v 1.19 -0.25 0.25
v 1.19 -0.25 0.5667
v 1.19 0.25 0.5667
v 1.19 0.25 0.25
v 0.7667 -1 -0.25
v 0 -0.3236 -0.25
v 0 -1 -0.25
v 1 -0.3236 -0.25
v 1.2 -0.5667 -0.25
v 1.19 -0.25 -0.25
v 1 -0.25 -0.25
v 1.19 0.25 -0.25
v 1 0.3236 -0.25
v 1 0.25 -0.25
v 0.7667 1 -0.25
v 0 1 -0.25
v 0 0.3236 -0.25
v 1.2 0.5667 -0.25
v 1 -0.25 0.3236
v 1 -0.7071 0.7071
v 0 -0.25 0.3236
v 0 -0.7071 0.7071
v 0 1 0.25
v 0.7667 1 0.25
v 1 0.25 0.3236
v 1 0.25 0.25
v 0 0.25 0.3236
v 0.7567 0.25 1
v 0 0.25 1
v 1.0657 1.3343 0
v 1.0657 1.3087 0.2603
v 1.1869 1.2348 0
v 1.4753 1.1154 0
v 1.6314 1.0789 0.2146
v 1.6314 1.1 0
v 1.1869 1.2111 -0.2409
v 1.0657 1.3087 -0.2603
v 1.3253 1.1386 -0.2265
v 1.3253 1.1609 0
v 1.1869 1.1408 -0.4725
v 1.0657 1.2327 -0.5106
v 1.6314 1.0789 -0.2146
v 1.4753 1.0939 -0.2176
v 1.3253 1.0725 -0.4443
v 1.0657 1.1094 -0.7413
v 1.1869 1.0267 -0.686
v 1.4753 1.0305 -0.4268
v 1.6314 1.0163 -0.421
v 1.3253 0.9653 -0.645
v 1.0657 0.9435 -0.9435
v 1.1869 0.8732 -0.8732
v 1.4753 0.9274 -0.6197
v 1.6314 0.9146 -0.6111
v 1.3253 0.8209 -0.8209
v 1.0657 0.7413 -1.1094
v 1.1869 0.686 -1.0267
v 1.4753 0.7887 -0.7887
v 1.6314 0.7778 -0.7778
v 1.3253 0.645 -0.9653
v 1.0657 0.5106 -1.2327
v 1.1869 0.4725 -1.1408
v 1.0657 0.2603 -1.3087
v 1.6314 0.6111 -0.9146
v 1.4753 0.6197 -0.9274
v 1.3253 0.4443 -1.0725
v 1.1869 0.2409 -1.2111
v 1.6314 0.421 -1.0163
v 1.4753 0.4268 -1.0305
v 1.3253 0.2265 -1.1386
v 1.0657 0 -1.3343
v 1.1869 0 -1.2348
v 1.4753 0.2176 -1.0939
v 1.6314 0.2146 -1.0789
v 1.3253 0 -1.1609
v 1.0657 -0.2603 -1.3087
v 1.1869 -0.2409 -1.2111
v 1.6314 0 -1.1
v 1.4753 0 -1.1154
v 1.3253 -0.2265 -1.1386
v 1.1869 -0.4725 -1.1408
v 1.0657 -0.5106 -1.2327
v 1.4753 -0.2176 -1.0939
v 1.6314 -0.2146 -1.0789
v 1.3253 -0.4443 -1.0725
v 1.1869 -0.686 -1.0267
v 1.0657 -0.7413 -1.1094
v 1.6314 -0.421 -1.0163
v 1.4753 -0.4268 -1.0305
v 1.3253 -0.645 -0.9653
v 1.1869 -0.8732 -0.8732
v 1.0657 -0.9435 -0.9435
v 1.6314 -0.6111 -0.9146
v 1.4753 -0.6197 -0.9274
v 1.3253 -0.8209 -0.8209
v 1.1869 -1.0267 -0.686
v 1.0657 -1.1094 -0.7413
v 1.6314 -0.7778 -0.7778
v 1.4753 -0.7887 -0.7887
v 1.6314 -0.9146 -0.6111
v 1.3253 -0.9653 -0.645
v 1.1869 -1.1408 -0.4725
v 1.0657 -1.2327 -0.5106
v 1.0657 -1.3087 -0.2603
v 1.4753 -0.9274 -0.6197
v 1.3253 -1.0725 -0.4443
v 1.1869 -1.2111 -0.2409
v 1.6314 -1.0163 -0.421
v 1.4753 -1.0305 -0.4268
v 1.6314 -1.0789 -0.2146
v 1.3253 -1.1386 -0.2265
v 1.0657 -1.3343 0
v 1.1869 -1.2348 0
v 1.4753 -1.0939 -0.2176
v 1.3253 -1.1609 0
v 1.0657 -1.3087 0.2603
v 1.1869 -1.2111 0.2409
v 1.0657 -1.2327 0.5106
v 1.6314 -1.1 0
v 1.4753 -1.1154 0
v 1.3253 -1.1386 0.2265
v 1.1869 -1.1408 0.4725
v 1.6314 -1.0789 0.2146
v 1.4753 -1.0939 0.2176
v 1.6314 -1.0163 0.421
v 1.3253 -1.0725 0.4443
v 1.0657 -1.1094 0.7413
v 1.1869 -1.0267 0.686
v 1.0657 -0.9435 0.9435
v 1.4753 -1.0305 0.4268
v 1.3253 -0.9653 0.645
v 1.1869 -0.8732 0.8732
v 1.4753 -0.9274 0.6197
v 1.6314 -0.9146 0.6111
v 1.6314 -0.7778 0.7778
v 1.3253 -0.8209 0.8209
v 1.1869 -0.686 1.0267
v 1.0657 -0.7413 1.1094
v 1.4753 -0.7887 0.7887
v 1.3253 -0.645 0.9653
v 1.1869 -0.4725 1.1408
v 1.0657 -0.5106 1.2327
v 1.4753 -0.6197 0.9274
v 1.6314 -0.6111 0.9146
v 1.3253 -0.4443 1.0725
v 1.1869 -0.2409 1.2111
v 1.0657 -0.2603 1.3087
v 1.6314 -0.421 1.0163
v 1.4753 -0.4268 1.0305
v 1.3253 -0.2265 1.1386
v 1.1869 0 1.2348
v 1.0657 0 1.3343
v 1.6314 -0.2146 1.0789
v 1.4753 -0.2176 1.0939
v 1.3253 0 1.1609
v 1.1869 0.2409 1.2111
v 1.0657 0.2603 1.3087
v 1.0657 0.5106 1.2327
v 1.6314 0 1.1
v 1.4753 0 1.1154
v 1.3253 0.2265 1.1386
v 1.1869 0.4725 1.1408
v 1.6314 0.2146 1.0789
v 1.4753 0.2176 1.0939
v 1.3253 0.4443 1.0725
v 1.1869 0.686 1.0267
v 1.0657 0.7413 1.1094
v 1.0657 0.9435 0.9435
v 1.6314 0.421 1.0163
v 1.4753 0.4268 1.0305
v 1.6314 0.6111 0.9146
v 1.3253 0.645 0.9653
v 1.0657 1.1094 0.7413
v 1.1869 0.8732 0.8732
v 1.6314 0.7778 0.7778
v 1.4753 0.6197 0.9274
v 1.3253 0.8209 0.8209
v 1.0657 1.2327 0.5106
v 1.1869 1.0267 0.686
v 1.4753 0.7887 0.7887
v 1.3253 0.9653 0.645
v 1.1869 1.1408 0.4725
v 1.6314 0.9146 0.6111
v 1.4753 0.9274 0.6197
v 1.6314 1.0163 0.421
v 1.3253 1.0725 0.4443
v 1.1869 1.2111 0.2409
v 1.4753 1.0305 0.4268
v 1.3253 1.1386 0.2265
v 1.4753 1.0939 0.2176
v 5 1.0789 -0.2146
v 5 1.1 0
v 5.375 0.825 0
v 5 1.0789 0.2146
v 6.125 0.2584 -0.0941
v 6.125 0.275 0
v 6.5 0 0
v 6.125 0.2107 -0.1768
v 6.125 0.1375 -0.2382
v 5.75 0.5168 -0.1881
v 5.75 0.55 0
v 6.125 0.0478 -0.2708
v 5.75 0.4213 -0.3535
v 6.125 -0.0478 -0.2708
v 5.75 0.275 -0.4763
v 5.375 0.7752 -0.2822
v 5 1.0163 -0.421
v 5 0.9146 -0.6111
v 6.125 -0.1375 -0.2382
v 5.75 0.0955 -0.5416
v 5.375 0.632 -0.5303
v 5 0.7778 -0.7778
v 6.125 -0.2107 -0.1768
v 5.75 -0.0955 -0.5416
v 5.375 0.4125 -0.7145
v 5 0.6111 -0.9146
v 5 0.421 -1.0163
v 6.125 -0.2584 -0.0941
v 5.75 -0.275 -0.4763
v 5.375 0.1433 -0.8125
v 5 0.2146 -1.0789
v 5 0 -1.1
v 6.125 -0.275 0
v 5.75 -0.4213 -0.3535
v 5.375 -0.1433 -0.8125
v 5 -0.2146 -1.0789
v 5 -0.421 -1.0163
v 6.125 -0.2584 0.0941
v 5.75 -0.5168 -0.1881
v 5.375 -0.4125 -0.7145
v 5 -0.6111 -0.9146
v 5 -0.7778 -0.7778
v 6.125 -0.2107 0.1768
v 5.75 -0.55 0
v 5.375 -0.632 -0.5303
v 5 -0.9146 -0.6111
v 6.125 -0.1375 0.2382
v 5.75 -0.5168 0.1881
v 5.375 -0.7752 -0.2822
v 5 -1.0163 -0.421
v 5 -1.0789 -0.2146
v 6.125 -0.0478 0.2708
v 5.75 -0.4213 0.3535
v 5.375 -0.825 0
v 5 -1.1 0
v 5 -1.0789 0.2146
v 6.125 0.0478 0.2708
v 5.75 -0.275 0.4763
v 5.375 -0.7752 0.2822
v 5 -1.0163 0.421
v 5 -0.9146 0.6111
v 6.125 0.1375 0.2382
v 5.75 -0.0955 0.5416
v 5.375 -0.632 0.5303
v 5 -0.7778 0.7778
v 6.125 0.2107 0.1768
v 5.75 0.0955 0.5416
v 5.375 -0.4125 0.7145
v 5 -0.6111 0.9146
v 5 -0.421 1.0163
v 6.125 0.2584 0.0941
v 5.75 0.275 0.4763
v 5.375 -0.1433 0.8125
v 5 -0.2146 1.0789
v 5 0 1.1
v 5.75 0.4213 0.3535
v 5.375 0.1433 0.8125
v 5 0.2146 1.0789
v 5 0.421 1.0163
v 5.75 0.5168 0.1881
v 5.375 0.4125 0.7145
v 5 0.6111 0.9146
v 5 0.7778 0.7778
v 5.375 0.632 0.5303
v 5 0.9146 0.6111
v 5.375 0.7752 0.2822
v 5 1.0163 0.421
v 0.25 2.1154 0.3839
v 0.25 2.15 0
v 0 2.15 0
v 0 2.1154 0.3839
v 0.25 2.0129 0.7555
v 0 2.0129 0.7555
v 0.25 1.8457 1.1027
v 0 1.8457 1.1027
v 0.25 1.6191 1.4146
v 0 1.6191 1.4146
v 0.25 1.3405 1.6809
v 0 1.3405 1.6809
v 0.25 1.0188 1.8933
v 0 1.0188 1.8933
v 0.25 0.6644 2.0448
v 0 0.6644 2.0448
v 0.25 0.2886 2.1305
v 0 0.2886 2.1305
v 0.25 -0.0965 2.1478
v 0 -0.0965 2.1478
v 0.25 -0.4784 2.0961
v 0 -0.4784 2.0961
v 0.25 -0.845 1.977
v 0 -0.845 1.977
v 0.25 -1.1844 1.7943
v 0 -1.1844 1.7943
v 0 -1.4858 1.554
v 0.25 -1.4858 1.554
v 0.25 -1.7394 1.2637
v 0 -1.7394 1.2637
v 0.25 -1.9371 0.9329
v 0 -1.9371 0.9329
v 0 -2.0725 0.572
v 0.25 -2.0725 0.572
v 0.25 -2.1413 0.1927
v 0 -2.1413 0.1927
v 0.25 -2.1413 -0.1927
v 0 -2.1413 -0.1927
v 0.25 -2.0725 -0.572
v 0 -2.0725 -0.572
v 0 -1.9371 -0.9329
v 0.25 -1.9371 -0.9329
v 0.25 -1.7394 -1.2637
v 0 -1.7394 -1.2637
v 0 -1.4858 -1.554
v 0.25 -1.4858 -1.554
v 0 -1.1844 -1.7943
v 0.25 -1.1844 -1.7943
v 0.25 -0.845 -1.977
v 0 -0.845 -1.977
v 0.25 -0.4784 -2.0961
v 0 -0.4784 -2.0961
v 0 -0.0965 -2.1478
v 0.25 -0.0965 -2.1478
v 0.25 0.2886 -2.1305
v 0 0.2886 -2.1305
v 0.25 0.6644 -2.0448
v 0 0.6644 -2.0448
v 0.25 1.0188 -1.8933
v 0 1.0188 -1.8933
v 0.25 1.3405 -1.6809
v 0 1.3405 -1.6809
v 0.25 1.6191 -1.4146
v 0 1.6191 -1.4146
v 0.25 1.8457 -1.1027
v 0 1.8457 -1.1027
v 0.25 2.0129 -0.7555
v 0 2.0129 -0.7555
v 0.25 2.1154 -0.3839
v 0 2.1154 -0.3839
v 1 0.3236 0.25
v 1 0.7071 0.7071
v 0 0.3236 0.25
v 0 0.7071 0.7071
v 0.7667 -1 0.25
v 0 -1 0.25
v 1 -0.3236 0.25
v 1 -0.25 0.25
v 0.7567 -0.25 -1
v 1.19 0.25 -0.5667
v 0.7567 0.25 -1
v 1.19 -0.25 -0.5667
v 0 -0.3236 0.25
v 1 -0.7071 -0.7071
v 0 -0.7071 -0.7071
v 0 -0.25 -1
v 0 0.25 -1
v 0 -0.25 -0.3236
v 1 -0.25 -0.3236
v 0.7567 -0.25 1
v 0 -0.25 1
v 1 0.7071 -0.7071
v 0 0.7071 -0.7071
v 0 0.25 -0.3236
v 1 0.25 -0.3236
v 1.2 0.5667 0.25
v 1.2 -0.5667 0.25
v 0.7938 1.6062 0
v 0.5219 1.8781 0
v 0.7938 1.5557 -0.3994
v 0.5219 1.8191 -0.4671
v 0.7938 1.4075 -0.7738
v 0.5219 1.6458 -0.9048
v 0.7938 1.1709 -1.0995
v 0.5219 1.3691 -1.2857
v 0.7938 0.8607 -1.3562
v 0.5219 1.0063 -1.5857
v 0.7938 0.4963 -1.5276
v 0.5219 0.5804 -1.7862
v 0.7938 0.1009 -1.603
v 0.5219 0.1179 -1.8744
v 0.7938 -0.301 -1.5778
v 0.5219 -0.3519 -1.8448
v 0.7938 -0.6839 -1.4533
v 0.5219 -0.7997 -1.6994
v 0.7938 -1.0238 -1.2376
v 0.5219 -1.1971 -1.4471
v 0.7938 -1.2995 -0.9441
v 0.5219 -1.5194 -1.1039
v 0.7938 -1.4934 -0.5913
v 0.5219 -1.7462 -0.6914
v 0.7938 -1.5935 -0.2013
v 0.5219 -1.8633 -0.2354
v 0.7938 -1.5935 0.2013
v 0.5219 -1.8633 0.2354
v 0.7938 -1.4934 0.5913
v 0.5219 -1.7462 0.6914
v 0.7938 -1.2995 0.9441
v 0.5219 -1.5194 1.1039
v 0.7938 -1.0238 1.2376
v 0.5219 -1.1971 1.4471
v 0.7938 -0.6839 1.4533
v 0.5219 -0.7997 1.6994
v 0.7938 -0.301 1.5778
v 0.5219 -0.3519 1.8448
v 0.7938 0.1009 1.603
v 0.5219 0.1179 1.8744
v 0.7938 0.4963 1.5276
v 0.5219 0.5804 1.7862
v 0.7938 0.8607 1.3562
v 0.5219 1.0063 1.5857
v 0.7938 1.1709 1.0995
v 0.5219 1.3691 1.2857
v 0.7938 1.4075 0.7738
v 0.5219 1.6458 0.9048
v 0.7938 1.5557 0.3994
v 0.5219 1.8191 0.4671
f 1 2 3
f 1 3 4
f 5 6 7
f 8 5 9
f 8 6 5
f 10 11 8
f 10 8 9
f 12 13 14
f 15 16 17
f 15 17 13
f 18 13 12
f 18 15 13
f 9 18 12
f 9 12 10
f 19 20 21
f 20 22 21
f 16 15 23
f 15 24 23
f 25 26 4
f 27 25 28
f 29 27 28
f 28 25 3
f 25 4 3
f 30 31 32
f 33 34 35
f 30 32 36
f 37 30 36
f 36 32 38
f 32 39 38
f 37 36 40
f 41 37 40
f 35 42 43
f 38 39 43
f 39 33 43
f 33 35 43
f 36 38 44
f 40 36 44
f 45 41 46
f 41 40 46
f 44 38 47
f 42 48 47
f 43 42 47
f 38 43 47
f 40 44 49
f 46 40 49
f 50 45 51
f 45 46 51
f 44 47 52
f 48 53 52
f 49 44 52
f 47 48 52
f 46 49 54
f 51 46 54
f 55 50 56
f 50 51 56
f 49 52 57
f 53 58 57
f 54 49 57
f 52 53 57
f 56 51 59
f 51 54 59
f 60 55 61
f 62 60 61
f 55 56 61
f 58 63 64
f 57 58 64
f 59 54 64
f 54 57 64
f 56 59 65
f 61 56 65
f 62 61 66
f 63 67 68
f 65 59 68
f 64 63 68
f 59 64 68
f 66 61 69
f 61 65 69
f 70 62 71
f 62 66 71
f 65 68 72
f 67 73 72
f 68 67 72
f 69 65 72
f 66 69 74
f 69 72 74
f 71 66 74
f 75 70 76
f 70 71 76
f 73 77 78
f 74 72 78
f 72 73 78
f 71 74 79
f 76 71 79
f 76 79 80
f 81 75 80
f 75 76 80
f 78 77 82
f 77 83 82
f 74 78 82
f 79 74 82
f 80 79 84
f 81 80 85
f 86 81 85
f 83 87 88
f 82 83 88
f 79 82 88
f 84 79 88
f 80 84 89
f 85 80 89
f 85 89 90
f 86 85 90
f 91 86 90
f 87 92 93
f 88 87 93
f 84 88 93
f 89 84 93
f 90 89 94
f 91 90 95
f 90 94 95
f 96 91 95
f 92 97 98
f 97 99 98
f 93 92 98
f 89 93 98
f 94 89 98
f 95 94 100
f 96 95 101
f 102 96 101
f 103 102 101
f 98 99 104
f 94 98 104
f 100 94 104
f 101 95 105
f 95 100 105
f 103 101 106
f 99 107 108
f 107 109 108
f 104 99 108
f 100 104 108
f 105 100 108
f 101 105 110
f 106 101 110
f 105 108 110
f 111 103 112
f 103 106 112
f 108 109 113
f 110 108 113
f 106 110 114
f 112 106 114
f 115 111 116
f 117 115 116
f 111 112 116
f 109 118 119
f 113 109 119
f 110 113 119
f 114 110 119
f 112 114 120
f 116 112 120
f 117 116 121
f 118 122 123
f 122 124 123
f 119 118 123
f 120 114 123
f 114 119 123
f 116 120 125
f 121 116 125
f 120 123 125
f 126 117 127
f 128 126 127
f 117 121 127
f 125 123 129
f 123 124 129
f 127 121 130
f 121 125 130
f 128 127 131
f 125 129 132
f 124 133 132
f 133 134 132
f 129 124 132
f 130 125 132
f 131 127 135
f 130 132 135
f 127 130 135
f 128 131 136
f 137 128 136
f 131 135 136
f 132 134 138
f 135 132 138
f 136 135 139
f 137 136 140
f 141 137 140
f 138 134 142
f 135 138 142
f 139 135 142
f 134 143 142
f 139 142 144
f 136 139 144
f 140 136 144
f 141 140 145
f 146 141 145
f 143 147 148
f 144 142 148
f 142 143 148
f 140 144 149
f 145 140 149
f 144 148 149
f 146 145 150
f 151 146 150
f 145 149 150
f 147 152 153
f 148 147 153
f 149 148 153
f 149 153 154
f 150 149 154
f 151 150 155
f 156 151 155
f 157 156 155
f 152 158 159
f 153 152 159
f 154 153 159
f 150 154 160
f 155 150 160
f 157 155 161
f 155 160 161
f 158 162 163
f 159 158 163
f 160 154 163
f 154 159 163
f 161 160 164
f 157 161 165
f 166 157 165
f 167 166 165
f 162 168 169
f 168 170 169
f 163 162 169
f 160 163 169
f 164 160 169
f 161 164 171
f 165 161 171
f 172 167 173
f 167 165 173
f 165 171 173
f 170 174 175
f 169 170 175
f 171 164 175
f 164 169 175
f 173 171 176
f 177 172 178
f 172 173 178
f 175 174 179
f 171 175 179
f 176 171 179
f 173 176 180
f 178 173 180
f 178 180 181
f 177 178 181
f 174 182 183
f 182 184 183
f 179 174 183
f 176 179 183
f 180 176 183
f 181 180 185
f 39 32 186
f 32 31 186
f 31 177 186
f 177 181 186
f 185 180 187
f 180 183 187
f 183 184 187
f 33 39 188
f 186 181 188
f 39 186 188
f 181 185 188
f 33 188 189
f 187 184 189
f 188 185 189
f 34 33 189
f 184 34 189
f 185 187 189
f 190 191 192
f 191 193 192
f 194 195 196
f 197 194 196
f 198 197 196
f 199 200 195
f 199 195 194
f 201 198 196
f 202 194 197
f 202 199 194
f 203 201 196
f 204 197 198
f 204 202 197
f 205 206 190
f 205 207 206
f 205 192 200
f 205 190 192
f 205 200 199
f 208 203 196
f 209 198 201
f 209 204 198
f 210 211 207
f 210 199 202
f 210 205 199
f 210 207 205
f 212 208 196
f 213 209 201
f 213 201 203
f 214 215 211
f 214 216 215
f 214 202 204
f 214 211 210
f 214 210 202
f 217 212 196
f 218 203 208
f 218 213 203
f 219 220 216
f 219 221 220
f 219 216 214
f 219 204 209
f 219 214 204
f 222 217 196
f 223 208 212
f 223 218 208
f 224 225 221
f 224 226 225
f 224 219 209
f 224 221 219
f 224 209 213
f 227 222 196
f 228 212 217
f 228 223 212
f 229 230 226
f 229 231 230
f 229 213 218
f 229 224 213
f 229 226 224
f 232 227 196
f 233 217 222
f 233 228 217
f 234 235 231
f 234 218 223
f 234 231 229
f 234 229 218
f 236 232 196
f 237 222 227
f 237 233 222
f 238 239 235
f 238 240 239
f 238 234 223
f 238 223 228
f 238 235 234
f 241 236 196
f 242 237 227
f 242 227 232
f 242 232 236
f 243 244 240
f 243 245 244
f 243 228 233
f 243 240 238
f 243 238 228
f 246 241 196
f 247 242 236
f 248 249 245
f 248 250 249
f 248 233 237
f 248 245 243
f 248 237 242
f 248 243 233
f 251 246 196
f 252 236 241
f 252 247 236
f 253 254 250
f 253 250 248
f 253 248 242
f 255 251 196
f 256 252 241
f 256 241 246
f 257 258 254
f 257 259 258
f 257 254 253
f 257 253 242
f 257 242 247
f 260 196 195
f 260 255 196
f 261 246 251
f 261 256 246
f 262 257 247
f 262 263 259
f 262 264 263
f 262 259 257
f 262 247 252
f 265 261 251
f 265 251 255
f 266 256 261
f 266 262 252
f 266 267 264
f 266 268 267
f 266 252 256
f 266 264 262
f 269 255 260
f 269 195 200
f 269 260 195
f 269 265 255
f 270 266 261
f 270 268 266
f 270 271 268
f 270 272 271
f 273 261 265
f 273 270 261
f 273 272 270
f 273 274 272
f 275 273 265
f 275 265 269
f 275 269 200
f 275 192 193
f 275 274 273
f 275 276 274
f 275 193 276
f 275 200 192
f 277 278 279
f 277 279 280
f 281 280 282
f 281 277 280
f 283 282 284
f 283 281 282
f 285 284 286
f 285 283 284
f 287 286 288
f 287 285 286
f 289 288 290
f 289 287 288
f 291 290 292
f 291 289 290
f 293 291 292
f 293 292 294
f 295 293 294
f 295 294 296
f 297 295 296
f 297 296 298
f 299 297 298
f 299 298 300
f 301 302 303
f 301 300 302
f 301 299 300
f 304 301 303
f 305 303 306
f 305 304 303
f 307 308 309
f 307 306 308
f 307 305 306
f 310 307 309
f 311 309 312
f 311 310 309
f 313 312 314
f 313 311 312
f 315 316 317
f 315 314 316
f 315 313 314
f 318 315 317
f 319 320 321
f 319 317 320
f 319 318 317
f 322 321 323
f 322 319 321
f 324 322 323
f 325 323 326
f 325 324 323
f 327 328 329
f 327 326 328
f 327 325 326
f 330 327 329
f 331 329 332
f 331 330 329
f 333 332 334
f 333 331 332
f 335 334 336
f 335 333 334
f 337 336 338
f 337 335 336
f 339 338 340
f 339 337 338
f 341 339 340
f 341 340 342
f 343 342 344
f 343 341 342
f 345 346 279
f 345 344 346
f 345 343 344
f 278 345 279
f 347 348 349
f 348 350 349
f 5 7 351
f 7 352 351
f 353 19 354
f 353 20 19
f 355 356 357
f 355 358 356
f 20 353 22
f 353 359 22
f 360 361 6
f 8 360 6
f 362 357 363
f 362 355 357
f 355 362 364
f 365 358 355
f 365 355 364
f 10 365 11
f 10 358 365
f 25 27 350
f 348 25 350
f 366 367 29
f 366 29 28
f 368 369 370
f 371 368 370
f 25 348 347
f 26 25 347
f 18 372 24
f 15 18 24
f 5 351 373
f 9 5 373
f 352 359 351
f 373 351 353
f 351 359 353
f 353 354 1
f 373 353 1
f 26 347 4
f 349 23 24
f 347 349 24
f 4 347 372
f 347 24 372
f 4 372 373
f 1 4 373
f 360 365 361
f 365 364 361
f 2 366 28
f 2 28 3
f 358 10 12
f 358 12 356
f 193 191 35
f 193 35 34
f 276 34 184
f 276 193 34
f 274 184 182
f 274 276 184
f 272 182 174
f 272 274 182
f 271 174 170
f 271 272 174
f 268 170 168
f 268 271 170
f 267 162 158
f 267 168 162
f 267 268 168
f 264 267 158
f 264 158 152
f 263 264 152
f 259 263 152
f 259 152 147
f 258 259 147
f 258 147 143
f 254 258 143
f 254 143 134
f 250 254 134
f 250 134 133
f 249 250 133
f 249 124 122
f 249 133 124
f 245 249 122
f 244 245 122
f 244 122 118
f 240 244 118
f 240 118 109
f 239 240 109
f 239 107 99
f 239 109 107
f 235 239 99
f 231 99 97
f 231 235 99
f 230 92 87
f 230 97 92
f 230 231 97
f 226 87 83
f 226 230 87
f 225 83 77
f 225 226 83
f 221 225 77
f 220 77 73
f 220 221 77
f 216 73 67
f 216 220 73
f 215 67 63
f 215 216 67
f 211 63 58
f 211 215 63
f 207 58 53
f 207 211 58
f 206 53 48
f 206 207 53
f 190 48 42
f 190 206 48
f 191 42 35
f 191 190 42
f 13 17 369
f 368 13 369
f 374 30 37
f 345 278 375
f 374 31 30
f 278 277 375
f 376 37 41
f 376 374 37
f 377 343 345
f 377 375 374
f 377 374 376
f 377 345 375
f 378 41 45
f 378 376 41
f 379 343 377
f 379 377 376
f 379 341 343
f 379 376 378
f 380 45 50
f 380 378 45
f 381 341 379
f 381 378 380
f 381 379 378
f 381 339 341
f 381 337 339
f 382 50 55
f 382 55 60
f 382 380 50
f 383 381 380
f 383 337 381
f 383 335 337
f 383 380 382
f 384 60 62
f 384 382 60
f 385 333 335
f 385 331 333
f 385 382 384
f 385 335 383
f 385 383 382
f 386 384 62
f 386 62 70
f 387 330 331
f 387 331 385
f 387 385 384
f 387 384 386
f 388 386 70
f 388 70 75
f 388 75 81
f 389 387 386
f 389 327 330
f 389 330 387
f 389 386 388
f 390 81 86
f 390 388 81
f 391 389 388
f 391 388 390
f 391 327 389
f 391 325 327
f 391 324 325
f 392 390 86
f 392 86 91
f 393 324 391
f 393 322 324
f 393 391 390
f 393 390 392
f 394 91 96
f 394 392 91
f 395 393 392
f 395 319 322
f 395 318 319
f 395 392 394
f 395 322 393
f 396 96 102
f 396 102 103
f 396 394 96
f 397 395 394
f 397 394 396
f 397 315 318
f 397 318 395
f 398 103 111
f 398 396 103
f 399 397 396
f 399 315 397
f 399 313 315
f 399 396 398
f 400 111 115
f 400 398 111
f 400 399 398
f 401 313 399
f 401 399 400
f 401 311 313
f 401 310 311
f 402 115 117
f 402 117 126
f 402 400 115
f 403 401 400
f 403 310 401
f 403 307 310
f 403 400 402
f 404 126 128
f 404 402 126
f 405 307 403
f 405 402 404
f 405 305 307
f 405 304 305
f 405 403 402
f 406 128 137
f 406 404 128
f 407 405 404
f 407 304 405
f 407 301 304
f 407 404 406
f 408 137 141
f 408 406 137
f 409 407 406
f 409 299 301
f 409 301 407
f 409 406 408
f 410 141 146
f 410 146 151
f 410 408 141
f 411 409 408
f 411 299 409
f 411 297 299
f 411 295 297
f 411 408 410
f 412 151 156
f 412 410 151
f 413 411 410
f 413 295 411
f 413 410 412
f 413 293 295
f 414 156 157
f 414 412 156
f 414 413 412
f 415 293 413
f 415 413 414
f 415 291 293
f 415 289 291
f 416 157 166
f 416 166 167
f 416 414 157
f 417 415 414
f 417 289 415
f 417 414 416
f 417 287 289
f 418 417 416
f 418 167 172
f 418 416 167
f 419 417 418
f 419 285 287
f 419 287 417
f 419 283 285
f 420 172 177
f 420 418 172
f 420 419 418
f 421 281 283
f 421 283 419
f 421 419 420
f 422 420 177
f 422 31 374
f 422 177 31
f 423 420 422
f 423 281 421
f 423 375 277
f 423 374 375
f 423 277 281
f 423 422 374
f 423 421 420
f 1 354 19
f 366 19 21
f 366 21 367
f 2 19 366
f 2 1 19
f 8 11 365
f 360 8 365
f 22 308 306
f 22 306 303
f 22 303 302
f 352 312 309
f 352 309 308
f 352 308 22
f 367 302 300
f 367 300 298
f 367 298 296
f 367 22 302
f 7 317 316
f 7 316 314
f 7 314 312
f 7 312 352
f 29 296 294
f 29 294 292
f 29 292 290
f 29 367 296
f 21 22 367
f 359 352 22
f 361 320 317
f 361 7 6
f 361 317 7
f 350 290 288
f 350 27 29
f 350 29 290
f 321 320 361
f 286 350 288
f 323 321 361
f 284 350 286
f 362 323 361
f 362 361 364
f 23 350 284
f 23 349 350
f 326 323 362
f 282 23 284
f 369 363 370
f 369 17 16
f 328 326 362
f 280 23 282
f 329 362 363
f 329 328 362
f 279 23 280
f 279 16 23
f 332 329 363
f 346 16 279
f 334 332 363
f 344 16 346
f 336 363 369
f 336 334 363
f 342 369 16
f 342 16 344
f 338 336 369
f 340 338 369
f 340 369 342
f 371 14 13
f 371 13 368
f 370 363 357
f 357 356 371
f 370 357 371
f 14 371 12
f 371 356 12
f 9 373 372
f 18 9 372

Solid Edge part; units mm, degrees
sketch "Sketch1" plane through (0, 0, 0) normal (0, 0, 1) x (1, 0, 0)
  line L0 (0, 0) -> (0, 2.15)
  line L1 (0, 2.15) -> (0.25, 2.15)
  line L2 (0.25, 2.15) -> (1.0657, 1.3343)
  arc A0 (1.0657, 1.3343) -> (1.6314, 1.1) centre (1.6314, 1.9) ccw
  line L3 (1.6314, 1.1) -> (5, 1.1)
  line L4 (5, 1.1) -> (6.5, 0)
  line L5 (6.5, 0) -> (0, 0)
revolve "RevolvedProtrusion1" add sketch "Sketch1" angle 360 about axis through (10.8, 0, 0) along (-1, 0, 0)
cosmetic_thread "Thread_1" size "M2.2" thread depth 2.9
sketch "Sketch2" plane through (0, 0, 0) normal (0, 0, 1) x (1, 0, 0)
  line L0 (0, -1) -> (0.7667, -1)
  line L1 (0.7667, -1) -> (1.2, -0.5667)
  line L2 (1.2, -0.5667) -> (1.2, 0.5667)
  line L3 (1.2, 0.5667) -> (0.7667, 1)
  line L4 (0.7667, 1) -> (0, 1)
  line L5 (0, 1) -> (0, -1)
extrude "ExtrudedCutout_1" cut sketch "Sketch2" against normal blind 0.25 and the other way blind 0.25
sketch "Sketch3" plane through (0, 0, 0) normal (0, -1, 0) x (1, 0, 0)
  line L0 (-0.1, 1) -> (0.7567, 1)
  line L1 (0.7567, 1) -> (1.19, 0.5667)
  line L2 (1.19, 0.5667) -> (1.19, -0.5667)
  line L3 (1.19, -0.5667) -> (0.7567, -1)
  line L4 (0.7567, -1) -> (-0.1, -1)
  line L5 (-0.1, -1) -> (-0.1, 1)
extrude "ExtrudedCutout_2" cut sketch "Sketch3" against normal blind 0.25 and the other way blind 0.25
sketch "Sketch4" plane through (0, 0, 0) normal (-1, 0, 0) x (0, -1, 0)
  line L0 (0.7071, 0.7071) -> (0, 0.1138)
  line L1 (0, 0.1138) -> (-0.7071, 0.7071)
  line L2 (-0.7071, 0.7071) -> (-0.1138, 0)
  line L3 (-0.1138, 0) -> (-0.7071, -0.7071)
  line L4 (-0.7071, -0.7071) -> (0, -0.1138)
  line L5 (0, -0.1138) -> (0.7071, -0.7071)
  line L6 (0.7071, -0.7071) -> (0.1138, 0)
  line L7 (0.1138, 0) -> (0.7071, 0.7071)
extrude "ExtrudedCutout_3" cut sketch "Sketch4" against normal blind 1
properties part number "bene_inox_212408-2,2X6,5"
